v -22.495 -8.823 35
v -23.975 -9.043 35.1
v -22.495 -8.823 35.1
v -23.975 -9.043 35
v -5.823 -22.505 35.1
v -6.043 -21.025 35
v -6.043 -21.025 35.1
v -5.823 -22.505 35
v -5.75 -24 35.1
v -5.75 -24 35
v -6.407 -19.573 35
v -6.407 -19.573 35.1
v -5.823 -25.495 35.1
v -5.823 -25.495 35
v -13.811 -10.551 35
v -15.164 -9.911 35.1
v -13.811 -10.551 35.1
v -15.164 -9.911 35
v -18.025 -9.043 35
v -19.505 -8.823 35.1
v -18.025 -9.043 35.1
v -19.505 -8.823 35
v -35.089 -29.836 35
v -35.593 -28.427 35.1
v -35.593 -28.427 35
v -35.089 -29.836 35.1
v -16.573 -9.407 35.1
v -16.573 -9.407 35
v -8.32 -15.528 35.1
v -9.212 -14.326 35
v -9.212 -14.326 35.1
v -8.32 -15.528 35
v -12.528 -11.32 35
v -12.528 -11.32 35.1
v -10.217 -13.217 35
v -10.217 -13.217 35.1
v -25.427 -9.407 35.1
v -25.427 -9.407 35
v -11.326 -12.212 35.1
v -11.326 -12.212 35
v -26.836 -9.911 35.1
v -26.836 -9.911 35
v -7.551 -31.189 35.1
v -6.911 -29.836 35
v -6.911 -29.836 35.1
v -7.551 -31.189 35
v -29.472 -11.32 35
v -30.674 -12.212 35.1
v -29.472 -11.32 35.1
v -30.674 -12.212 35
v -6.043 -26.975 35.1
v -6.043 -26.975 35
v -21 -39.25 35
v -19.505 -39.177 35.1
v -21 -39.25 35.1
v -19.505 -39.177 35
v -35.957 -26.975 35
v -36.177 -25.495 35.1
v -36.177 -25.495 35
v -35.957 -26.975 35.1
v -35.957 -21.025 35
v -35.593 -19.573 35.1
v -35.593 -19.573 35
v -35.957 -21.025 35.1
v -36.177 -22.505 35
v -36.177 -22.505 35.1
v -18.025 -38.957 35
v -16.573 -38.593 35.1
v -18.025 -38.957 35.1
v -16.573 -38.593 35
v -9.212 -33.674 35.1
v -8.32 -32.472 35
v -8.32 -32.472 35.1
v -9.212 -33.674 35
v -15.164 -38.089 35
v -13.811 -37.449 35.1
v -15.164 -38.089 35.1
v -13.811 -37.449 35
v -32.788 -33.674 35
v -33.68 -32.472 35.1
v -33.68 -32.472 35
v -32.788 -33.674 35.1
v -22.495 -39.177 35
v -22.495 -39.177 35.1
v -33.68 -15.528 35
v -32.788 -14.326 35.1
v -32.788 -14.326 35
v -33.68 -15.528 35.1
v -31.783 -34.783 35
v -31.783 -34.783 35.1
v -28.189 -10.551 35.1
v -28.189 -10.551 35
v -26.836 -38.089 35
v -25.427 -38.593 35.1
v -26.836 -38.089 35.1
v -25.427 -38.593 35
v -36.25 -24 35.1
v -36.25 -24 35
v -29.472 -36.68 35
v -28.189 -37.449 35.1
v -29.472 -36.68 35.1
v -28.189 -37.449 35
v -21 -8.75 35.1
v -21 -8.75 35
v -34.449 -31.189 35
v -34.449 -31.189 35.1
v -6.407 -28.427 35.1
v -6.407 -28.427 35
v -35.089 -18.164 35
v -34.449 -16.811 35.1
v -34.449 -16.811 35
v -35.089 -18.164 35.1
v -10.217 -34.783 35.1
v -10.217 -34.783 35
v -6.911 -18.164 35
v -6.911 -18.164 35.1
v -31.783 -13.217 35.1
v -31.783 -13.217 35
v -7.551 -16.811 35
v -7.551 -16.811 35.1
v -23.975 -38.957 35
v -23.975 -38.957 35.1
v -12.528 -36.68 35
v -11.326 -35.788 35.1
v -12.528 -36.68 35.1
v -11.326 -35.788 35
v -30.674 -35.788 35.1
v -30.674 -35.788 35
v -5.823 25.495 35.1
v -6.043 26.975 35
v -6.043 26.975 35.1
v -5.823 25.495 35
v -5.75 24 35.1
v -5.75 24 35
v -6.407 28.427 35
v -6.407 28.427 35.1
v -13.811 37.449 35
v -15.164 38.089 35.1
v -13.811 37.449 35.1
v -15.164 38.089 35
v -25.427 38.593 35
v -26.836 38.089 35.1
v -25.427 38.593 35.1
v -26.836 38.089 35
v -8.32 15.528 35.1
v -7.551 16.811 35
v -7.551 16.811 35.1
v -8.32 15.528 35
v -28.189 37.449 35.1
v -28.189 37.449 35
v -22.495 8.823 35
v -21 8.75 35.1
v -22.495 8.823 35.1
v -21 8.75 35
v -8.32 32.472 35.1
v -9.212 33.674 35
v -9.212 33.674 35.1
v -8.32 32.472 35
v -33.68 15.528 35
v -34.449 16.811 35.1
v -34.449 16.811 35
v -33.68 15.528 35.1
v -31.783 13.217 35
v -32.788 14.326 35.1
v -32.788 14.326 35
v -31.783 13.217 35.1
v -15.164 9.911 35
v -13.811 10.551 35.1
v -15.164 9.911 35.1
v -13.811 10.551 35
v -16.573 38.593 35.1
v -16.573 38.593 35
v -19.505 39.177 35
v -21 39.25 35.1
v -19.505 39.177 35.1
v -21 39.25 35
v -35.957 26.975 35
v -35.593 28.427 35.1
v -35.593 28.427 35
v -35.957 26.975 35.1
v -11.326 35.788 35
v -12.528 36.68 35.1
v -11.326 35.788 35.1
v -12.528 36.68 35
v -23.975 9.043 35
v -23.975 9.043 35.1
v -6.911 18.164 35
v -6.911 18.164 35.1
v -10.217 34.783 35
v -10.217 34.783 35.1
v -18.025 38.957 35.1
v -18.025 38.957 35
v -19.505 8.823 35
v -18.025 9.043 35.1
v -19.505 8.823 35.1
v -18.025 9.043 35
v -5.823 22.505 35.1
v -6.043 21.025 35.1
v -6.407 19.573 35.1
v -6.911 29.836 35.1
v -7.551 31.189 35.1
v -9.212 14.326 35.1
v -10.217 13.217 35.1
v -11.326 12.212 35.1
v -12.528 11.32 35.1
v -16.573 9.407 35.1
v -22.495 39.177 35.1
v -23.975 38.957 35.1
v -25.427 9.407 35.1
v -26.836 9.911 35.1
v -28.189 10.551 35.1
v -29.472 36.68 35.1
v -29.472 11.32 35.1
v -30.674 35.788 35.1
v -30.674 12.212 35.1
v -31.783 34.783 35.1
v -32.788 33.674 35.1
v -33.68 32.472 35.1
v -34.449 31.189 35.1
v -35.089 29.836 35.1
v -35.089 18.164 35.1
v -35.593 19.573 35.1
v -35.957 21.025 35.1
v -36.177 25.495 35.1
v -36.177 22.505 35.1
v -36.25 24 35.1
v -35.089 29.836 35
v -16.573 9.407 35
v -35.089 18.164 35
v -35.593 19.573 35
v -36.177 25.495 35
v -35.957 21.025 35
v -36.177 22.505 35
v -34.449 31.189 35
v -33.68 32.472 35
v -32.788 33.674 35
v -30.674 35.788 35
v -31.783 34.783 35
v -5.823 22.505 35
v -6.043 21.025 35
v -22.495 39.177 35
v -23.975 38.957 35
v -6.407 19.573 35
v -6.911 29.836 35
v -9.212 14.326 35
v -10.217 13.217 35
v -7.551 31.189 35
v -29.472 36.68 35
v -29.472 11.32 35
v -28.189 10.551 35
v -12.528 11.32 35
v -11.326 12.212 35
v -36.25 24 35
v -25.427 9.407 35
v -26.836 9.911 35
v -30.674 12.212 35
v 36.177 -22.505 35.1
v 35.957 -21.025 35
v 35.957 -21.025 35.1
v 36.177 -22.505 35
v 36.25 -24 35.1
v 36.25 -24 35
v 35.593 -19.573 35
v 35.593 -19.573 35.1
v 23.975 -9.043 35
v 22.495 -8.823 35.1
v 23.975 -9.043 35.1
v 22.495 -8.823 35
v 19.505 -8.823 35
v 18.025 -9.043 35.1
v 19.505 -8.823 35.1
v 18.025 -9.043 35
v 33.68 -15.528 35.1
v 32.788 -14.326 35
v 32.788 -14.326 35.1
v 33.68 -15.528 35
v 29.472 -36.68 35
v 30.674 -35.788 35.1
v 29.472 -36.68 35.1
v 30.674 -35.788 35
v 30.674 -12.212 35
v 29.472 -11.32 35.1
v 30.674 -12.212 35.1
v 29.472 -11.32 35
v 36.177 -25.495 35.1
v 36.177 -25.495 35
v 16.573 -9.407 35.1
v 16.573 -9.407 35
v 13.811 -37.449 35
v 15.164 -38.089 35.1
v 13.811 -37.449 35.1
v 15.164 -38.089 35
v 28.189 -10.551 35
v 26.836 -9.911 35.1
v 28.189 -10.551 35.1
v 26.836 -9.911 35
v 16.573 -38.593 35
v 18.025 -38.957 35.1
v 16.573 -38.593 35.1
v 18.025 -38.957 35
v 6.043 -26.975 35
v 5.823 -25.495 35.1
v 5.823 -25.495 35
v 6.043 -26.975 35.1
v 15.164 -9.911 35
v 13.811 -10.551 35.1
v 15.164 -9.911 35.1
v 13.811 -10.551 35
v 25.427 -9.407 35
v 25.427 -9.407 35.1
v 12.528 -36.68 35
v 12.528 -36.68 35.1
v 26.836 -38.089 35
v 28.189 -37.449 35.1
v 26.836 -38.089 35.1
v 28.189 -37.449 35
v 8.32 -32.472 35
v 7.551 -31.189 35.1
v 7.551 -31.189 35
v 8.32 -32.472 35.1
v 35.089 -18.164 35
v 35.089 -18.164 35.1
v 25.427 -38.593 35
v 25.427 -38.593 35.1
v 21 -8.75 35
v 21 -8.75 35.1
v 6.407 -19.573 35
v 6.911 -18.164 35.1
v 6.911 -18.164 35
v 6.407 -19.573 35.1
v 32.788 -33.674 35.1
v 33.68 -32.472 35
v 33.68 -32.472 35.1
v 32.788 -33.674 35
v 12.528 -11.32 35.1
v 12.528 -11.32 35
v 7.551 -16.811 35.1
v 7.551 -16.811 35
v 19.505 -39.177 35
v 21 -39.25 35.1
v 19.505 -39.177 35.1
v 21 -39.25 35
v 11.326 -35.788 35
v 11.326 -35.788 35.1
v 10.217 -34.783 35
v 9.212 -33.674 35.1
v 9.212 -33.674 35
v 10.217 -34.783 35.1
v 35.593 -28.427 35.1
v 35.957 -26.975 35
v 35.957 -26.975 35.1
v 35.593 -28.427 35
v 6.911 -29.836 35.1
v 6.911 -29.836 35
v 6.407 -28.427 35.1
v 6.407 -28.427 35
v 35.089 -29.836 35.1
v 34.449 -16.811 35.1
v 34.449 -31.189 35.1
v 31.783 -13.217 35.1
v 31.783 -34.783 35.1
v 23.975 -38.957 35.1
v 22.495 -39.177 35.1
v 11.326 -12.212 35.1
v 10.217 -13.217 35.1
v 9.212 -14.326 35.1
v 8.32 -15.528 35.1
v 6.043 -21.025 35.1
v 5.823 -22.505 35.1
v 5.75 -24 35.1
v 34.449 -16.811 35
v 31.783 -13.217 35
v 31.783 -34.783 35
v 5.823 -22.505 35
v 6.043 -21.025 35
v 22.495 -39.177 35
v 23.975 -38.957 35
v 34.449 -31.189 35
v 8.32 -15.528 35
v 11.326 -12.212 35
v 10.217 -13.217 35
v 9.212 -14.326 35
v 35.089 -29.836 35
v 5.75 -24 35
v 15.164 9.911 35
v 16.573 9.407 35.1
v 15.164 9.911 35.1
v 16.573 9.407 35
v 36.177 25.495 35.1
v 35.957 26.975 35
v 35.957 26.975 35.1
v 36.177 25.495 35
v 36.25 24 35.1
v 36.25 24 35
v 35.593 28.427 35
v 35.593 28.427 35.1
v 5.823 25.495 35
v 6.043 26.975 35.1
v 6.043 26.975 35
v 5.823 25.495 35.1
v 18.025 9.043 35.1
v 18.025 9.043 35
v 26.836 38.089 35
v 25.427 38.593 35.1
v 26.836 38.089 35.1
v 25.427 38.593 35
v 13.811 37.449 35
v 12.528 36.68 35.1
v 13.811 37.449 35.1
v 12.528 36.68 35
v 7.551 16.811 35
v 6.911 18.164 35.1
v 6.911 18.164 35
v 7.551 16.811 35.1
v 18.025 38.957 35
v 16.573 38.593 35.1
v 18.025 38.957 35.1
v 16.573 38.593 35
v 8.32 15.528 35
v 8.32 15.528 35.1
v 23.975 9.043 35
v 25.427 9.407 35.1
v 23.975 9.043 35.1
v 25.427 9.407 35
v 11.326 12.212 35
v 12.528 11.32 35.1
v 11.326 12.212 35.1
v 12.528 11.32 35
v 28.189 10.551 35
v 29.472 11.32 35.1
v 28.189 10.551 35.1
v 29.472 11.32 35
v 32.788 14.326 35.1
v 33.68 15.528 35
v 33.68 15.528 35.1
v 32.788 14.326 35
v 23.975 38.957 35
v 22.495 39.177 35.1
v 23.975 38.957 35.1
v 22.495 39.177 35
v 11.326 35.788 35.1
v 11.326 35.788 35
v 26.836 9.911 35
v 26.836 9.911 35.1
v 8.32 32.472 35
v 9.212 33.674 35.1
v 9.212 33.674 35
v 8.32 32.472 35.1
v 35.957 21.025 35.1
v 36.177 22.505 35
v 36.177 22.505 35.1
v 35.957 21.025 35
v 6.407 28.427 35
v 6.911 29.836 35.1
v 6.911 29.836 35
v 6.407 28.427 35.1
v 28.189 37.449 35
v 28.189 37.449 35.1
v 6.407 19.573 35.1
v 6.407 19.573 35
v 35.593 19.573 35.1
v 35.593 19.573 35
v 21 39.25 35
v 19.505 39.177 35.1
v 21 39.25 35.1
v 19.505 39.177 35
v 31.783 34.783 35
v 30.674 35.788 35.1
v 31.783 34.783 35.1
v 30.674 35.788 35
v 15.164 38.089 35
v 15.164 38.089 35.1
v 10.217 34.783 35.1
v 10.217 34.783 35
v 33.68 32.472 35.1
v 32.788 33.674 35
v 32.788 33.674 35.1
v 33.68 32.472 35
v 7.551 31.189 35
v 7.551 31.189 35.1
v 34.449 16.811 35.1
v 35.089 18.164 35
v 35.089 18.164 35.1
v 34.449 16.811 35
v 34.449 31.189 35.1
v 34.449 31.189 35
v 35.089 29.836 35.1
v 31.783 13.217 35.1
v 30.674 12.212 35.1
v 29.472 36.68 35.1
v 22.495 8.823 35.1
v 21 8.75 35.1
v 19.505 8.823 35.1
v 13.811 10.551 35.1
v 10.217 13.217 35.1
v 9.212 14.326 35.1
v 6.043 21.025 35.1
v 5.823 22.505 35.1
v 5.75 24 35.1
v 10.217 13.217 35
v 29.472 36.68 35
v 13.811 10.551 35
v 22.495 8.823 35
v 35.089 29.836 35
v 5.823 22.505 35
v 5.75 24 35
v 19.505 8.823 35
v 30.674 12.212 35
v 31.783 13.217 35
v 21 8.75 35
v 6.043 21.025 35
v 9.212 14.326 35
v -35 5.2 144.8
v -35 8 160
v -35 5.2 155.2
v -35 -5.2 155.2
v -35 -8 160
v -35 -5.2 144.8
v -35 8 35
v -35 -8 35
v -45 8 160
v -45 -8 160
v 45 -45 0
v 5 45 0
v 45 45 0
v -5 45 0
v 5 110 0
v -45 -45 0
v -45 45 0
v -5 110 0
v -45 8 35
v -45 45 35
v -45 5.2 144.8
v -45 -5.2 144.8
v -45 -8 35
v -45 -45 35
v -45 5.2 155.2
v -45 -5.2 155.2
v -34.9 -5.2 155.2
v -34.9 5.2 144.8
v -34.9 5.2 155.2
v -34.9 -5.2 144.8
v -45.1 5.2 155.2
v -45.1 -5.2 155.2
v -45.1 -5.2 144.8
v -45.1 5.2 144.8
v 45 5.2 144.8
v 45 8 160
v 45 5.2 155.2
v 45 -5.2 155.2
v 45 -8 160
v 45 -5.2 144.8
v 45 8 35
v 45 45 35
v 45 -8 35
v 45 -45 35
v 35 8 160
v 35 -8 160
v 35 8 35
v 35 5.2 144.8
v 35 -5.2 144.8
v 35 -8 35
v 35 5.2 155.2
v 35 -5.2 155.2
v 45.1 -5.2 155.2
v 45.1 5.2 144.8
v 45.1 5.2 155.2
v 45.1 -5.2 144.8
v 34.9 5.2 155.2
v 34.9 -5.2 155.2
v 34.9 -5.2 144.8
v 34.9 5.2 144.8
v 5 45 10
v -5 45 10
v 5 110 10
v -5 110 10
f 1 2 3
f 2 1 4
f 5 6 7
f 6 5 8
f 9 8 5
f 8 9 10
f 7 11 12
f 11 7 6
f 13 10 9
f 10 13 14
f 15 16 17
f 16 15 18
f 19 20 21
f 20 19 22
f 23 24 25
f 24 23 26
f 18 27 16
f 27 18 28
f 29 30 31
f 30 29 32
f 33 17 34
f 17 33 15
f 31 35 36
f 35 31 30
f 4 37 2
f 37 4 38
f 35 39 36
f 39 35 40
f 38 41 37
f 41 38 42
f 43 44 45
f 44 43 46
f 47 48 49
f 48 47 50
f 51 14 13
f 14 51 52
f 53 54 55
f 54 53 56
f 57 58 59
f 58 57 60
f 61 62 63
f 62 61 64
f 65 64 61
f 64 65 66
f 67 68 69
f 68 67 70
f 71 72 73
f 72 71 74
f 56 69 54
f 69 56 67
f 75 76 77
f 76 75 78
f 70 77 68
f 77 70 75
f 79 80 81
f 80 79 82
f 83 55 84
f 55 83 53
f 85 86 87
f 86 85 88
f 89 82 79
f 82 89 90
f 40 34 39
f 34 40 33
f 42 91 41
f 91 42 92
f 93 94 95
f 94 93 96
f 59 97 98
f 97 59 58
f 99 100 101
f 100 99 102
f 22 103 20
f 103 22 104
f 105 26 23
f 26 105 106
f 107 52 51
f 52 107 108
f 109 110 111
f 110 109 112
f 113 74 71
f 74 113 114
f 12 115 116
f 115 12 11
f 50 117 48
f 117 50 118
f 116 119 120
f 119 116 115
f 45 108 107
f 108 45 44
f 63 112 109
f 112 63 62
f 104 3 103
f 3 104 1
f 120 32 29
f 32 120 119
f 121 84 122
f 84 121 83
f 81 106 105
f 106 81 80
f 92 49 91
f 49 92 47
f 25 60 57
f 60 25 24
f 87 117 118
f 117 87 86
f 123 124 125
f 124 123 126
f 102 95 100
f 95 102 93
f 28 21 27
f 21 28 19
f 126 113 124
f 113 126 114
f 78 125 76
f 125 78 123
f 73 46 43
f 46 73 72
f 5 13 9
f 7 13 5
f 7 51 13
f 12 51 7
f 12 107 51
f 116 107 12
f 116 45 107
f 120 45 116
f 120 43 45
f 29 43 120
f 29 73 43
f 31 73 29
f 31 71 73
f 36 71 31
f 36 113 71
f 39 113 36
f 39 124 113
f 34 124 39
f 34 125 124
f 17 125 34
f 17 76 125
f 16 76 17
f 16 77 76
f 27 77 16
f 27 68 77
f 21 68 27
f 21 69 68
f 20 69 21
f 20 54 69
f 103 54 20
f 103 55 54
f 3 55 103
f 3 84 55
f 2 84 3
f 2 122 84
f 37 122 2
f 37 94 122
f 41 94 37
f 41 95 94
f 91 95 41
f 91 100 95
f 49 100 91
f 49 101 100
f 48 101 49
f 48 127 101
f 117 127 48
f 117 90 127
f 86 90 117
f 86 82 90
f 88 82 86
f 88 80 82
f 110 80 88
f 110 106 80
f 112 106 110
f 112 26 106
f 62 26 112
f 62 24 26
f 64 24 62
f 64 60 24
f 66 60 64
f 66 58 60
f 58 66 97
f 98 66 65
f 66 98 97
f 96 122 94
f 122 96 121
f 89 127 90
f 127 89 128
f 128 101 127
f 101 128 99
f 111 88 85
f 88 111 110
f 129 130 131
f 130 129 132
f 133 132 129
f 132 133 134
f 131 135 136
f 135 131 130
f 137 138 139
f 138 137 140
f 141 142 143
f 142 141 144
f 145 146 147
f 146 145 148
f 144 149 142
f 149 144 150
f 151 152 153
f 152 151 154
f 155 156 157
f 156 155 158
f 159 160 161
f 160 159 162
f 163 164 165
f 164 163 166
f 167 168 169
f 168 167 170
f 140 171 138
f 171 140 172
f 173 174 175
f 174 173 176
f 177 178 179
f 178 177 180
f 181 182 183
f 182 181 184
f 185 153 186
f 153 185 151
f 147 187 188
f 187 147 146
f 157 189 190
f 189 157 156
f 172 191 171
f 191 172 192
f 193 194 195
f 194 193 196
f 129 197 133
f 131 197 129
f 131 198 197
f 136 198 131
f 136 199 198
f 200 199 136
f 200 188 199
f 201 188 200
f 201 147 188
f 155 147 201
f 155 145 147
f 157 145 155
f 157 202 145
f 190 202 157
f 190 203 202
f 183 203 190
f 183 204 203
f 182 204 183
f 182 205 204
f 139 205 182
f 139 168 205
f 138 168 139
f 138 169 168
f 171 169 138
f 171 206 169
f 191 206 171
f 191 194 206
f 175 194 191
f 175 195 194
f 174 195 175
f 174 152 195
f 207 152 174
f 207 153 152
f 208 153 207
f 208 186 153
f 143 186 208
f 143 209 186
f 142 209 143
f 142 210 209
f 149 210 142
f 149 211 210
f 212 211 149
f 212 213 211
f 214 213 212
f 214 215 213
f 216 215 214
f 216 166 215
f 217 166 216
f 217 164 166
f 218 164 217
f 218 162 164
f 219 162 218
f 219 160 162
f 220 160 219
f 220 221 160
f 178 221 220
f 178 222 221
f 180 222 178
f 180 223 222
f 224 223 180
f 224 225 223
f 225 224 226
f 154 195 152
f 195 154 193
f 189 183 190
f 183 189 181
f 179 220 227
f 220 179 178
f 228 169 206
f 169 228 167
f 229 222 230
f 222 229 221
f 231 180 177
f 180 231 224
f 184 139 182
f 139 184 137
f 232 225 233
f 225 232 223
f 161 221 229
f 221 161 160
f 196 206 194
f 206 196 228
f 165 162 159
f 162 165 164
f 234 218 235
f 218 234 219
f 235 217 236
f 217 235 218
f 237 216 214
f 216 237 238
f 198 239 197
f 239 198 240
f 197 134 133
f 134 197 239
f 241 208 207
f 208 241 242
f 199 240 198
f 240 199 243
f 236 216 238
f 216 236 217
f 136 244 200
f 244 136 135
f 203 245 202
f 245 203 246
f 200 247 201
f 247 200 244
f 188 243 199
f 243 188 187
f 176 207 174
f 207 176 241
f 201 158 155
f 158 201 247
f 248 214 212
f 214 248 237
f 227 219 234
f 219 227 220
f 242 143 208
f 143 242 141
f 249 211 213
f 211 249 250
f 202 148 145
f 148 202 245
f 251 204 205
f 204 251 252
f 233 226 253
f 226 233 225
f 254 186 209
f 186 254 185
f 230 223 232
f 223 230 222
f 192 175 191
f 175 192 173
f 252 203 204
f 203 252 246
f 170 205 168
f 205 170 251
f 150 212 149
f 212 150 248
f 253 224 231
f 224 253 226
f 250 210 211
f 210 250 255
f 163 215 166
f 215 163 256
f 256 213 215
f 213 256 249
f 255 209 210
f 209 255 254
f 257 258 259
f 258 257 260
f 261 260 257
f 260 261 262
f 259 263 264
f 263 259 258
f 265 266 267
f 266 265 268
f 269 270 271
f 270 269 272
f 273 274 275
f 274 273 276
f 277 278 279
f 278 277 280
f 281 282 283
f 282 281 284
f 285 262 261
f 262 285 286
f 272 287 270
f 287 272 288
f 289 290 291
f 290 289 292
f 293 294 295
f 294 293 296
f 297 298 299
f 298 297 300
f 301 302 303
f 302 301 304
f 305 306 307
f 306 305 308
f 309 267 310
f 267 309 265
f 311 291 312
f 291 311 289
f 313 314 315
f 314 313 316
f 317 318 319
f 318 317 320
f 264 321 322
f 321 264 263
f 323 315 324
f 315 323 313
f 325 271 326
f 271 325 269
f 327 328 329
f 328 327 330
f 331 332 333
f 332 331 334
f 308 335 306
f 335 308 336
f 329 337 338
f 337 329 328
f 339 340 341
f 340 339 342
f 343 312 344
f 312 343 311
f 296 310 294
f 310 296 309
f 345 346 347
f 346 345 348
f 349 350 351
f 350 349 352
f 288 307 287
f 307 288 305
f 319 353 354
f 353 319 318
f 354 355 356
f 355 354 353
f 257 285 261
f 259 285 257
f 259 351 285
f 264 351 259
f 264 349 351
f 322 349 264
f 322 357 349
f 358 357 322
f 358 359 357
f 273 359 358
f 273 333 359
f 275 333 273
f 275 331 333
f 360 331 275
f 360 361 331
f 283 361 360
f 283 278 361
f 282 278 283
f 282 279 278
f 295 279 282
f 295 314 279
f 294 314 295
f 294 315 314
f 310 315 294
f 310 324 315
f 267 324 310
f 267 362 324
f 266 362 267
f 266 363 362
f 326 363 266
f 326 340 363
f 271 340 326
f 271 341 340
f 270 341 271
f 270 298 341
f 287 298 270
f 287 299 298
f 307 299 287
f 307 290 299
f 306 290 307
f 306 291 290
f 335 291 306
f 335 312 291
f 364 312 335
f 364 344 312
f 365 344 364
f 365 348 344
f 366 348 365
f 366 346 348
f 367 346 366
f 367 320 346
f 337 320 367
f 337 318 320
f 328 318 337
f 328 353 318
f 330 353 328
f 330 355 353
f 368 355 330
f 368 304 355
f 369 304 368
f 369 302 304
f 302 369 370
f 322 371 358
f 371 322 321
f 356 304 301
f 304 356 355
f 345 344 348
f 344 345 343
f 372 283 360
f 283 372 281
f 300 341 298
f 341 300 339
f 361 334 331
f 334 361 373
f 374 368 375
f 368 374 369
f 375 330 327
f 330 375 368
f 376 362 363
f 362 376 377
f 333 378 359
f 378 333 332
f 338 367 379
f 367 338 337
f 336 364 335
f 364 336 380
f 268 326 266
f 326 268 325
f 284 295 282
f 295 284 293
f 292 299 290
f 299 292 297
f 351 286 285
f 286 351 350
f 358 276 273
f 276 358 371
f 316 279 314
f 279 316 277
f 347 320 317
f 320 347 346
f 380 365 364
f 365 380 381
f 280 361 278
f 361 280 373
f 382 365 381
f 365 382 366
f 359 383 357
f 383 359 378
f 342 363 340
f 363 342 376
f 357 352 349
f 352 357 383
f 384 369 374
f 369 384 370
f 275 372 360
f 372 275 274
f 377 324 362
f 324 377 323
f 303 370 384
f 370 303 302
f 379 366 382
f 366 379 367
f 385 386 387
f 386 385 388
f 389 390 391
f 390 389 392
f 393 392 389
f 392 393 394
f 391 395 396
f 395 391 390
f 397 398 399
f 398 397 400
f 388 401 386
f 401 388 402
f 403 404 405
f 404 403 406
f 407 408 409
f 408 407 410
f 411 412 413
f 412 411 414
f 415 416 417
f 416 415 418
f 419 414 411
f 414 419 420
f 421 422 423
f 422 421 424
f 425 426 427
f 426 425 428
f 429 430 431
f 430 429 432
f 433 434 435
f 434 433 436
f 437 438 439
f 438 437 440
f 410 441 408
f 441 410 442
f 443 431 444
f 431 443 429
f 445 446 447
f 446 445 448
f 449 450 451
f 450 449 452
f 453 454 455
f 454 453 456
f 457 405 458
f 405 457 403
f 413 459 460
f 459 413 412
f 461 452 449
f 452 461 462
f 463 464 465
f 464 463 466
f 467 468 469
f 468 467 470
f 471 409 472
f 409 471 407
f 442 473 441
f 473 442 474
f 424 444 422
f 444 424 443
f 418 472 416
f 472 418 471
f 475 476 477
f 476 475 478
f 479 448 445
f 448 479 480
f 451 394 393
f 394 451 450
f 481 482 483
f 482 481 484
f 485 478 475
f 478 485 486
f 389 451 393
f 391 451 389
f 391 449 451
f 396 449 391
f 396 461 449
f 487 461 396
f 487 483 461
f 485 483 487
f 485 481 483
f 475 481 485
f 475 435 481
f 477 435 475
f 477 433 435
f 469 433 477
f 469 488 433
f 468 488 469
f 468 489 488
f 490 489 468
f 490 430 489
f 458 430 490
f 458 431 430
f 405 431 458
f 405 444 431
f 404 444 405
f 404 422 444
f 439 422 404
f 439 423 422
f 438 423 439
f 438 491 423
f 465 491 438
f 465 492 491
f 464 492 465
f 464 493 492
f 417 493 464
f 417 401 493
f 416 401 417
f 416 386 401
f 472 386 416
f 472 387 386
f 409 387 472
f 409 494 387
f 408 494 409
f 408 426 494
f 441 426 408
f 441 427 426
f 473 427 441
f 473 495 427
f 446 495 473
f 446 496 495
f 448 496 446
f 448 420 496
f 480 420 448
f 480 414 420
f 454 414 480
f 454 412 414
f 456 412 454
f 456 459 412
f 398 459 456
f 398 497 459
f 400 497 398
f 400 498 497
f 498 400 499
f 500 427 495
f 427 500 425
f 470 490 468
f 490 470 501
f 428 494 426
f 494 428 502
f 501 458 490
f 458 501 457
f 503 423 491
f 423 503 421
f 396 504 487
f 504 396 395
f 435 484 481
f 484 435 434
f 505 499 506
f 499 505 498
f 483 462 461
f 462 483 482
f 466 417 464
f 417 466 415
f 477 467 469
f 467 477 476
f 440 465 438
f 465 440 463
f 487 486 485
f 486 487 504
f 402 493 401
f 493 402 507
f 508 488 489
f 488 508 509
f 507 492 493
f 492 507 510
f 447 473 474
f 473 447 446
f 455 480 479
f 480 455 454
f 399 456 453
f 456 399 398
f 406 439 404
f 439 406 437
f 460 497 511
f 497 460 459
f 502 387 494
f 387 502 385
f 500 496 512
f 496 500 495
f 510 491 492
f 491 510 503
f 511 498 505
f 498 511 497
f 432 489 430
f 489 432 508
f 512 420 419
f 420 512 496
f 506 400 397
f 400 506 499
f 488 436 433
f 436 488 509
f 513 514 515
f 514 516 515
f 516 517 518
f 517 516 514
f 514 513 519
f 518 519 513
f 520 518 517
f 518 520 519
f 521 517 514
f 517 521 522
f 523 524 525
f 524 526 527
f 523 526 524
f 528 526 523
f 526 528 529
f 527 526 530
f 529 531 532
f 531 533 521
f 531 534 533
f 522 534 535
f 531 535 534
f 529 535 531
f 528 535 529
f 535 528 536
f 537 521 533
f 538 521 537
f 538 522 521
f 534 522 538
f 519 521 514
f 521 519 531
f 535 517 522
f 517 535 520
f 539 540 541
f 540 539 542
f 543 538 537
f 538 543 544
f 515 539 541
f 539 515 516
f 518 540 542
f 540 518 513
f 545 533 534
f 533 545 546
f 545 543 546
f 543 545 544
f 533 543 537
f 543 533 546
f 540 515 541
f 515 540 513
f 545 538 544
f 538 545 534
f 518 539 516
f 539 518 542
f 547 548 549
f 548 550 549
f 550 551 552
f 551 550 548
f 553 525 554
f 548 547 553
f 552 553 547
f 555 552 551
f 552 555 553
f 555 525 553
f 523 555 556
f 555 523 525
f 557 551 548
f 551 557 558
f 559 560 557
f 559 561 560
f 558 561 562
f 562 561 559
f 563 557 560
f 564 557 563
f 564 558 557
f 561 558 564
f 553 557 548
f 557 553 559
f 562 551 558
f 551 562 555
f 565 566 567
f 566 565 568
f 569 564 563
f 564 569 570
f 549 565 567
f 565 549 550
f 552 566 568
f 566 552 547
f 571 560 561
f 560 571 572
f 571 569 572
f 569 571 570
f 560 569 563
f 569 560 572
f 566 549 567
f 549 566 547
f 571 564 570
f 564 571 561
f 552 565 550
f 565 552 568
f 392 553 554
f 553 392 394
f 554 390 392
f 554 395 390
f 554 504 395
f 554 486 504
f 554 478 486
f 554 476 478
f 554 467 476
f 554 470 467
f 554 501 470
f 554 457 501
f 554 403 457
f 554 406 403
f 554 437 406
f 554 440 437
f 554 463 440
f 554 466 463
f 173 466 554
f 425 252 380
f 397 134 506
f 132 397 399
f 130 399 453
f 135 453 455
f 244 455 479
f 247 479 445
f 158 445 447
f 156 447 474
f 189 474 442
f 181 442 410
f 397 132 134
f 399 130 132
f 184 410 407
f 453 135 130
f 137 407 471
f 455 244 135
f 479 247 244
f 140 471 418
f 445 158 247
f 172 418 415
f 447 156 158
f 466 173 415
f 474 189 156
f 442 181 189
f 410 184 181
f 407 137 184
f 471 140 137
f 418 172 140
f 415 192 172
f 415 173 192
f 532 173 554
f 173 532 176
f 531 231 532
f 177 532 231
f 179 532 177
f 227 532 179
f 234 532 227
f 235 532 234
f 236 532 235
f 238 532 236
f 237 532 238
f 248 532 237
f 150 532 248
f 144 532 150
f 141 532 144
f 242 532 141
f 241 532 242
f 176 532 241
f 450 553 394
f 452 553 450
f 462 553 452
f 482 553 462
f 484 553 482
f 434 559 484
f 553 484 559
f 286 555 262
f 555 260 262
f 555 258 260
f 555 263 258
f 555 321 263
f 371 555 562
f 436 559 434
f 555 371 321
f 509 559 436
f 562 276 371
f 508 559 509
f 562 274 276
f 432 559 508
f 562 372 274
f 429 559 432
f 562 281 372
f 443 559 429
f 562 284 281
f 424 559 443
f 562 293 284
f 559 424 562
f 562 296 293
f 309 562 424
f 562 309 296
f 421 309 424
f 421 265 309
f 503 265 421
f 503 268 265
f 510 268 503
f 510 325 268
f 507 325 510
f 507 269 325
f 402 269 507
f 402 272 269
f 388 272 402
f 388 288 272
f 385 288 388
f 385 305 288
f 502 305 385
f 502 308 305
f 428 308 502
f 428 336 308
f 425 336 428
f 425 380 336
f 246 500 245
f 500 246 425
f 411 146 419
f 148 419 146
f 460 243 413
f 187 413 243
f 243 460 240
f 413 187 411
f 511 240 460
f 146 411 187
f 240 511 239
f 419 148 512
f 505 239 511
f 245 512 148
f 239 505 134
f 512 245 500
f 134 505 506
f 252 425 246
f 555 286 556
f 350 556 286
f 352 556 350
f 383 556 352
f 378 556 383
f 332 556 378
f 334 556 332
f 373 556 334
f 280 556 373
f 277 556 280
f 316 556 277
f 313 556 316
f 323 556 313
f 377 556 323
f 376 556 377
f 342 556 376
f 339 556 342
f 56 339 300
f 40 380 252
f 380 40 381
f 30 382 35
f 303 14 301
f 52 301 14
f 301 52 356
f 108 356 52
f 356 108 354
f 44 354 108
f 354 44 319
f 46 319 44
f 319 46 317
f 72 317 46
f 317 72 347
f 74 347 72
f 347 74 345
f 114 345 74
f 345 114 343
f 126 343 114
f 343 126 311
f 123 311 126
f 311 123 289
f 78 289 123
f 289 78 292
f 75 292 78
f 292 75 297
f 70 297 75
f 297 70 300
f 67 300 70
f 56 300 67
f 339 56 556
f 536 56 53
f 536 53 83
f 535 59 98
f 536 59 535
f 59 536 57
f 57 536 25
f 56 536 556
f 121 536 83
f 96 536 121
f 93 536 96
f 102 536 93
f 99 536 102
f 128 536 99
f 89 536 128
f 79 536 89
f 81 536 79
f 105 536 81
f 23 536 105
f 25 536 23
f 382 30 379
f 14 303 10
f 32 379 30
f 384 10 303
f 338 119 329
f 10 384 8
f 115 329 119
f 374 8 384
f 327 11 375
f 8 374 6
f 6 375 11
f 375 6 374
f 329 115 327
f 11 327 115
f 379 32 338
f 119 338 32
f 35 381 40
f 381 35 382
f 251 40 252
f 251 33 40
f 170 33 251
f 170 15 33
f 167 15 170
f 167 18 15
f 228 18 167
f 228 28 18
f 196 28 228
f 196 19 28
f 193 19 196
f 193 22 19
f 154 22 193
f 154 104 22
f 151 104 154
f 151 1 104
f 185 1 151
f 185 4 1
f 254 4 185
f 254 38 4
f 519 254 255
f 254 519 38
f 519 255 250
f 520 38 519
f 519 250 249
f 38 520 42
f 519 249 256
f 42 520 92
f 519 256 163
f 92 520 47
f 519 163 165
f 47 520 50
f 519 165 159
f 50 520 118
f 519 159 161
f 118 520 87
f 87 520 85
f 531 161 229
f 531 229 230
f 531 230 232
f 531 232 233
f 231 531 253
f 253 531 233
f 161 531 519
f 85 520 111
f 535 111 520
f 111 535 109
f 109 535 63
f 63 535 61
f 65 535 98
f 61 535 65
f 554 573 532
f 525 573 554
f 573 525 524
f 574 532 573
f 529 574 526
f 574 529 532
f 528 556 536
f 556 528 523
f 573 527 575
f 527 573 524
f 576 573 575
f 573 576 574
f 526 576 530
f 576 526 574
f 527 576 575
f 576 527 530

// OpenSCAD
// Carrier for four 50 mL conical tubes, printed as two parts side by side.
// Units: millimetres. Print orientation: parts rest on the XY plane (z = 0),
// building upward (+Z). Part 1 is centred on the origin; Part 2 (handle) is
// offset in +Y so the two parts print side by side.

$fn = 64;

// ---------------- Part 1: base block + two posts ----------------
base_w   = 90;   // base block width  (X)
base_d   = 90;   // base block depth   (Y)
base_h   = 35;   // base block height  (Z)

seat_d   = 30.5; // blind seat diameter
seat_dep = 30;   // blind seat depth (leaves a 5 mm floor)
seat_x   = 21;   // seat centre |x|
seat_y   = 24;   // seat centre |y|

post_t   = 10;   // post thickness (X)
post_w   = 16;   // post width     (Y)
post_h   = 160;  // post height (top at z = 160)
post_x   = 40;   // post centre |x| (10 mm thick, flush with 90 mm end faces)
post_hole = 10.4;// square through-hole side (X)
post_hole_z = 150; // hole centre height

// ---------------- Part 2: handle bar ----------------
bar_t    = 10;   // bar thickness (X)
bar_w    = 10;   // bar width     (Y)
bar_len  = 100;  // bar length    (Y)
bar_y    = 60;   // bar centre Y (spans y = 55..65, 10 mm gap to base +Y face)

// ================= PART 1 =================
part1() ;

module part1() {
    union() {
        // Base block, centred on the origin
        translate([-base_w/2, -base_d/2, 0])
            cube([base_w, base_d, base_h]);

        // Four blind tube seats (30.5 mm dia, 30 mm deep, 5 mm floor)
        for (sx = [-seat_x, seat_x])
            for (sy = [-seat_y, seat_y])
                translate([sx, sy, base_h - seat_dep])
                    cylinder(h = seat_dep + 0.1, d = seat_d);

        // Two posts, flush with the X end faces, centred on y = 0
        for (px = [-post_x, post_x]) {
            translate([px - post_t/2, -post_w/2, 0])
                cube([post_t, post_w, post_h]);

            // 10.4 x 10.4 mm square through-hole along X, centred at z = 150
            translate([px - post_t/2 - 0.1, -post_hole/2, post_hole_z - post_hole/2])
                cube([post_t + 0.2, post_hole, post_hole]);
        }
    }
}

// ================= PART 2 (handle) =================
// Printed side by side with part 1 (offset in +Y). After printing, the bar is
// pushed through both posts (it spans y = 55..65, i.e. 10 mm clear of the base).
translate([0, bar_y, 0])
    part2();

module part2() {
    // Square bar 10 x 10 mm, 100 mm long, lying on the bed along Y, centred on y = 0
    translate([-bar_t/2, -bar_len/2, 0])
        cube([bar_t, bar_len, bar_w]);
}
